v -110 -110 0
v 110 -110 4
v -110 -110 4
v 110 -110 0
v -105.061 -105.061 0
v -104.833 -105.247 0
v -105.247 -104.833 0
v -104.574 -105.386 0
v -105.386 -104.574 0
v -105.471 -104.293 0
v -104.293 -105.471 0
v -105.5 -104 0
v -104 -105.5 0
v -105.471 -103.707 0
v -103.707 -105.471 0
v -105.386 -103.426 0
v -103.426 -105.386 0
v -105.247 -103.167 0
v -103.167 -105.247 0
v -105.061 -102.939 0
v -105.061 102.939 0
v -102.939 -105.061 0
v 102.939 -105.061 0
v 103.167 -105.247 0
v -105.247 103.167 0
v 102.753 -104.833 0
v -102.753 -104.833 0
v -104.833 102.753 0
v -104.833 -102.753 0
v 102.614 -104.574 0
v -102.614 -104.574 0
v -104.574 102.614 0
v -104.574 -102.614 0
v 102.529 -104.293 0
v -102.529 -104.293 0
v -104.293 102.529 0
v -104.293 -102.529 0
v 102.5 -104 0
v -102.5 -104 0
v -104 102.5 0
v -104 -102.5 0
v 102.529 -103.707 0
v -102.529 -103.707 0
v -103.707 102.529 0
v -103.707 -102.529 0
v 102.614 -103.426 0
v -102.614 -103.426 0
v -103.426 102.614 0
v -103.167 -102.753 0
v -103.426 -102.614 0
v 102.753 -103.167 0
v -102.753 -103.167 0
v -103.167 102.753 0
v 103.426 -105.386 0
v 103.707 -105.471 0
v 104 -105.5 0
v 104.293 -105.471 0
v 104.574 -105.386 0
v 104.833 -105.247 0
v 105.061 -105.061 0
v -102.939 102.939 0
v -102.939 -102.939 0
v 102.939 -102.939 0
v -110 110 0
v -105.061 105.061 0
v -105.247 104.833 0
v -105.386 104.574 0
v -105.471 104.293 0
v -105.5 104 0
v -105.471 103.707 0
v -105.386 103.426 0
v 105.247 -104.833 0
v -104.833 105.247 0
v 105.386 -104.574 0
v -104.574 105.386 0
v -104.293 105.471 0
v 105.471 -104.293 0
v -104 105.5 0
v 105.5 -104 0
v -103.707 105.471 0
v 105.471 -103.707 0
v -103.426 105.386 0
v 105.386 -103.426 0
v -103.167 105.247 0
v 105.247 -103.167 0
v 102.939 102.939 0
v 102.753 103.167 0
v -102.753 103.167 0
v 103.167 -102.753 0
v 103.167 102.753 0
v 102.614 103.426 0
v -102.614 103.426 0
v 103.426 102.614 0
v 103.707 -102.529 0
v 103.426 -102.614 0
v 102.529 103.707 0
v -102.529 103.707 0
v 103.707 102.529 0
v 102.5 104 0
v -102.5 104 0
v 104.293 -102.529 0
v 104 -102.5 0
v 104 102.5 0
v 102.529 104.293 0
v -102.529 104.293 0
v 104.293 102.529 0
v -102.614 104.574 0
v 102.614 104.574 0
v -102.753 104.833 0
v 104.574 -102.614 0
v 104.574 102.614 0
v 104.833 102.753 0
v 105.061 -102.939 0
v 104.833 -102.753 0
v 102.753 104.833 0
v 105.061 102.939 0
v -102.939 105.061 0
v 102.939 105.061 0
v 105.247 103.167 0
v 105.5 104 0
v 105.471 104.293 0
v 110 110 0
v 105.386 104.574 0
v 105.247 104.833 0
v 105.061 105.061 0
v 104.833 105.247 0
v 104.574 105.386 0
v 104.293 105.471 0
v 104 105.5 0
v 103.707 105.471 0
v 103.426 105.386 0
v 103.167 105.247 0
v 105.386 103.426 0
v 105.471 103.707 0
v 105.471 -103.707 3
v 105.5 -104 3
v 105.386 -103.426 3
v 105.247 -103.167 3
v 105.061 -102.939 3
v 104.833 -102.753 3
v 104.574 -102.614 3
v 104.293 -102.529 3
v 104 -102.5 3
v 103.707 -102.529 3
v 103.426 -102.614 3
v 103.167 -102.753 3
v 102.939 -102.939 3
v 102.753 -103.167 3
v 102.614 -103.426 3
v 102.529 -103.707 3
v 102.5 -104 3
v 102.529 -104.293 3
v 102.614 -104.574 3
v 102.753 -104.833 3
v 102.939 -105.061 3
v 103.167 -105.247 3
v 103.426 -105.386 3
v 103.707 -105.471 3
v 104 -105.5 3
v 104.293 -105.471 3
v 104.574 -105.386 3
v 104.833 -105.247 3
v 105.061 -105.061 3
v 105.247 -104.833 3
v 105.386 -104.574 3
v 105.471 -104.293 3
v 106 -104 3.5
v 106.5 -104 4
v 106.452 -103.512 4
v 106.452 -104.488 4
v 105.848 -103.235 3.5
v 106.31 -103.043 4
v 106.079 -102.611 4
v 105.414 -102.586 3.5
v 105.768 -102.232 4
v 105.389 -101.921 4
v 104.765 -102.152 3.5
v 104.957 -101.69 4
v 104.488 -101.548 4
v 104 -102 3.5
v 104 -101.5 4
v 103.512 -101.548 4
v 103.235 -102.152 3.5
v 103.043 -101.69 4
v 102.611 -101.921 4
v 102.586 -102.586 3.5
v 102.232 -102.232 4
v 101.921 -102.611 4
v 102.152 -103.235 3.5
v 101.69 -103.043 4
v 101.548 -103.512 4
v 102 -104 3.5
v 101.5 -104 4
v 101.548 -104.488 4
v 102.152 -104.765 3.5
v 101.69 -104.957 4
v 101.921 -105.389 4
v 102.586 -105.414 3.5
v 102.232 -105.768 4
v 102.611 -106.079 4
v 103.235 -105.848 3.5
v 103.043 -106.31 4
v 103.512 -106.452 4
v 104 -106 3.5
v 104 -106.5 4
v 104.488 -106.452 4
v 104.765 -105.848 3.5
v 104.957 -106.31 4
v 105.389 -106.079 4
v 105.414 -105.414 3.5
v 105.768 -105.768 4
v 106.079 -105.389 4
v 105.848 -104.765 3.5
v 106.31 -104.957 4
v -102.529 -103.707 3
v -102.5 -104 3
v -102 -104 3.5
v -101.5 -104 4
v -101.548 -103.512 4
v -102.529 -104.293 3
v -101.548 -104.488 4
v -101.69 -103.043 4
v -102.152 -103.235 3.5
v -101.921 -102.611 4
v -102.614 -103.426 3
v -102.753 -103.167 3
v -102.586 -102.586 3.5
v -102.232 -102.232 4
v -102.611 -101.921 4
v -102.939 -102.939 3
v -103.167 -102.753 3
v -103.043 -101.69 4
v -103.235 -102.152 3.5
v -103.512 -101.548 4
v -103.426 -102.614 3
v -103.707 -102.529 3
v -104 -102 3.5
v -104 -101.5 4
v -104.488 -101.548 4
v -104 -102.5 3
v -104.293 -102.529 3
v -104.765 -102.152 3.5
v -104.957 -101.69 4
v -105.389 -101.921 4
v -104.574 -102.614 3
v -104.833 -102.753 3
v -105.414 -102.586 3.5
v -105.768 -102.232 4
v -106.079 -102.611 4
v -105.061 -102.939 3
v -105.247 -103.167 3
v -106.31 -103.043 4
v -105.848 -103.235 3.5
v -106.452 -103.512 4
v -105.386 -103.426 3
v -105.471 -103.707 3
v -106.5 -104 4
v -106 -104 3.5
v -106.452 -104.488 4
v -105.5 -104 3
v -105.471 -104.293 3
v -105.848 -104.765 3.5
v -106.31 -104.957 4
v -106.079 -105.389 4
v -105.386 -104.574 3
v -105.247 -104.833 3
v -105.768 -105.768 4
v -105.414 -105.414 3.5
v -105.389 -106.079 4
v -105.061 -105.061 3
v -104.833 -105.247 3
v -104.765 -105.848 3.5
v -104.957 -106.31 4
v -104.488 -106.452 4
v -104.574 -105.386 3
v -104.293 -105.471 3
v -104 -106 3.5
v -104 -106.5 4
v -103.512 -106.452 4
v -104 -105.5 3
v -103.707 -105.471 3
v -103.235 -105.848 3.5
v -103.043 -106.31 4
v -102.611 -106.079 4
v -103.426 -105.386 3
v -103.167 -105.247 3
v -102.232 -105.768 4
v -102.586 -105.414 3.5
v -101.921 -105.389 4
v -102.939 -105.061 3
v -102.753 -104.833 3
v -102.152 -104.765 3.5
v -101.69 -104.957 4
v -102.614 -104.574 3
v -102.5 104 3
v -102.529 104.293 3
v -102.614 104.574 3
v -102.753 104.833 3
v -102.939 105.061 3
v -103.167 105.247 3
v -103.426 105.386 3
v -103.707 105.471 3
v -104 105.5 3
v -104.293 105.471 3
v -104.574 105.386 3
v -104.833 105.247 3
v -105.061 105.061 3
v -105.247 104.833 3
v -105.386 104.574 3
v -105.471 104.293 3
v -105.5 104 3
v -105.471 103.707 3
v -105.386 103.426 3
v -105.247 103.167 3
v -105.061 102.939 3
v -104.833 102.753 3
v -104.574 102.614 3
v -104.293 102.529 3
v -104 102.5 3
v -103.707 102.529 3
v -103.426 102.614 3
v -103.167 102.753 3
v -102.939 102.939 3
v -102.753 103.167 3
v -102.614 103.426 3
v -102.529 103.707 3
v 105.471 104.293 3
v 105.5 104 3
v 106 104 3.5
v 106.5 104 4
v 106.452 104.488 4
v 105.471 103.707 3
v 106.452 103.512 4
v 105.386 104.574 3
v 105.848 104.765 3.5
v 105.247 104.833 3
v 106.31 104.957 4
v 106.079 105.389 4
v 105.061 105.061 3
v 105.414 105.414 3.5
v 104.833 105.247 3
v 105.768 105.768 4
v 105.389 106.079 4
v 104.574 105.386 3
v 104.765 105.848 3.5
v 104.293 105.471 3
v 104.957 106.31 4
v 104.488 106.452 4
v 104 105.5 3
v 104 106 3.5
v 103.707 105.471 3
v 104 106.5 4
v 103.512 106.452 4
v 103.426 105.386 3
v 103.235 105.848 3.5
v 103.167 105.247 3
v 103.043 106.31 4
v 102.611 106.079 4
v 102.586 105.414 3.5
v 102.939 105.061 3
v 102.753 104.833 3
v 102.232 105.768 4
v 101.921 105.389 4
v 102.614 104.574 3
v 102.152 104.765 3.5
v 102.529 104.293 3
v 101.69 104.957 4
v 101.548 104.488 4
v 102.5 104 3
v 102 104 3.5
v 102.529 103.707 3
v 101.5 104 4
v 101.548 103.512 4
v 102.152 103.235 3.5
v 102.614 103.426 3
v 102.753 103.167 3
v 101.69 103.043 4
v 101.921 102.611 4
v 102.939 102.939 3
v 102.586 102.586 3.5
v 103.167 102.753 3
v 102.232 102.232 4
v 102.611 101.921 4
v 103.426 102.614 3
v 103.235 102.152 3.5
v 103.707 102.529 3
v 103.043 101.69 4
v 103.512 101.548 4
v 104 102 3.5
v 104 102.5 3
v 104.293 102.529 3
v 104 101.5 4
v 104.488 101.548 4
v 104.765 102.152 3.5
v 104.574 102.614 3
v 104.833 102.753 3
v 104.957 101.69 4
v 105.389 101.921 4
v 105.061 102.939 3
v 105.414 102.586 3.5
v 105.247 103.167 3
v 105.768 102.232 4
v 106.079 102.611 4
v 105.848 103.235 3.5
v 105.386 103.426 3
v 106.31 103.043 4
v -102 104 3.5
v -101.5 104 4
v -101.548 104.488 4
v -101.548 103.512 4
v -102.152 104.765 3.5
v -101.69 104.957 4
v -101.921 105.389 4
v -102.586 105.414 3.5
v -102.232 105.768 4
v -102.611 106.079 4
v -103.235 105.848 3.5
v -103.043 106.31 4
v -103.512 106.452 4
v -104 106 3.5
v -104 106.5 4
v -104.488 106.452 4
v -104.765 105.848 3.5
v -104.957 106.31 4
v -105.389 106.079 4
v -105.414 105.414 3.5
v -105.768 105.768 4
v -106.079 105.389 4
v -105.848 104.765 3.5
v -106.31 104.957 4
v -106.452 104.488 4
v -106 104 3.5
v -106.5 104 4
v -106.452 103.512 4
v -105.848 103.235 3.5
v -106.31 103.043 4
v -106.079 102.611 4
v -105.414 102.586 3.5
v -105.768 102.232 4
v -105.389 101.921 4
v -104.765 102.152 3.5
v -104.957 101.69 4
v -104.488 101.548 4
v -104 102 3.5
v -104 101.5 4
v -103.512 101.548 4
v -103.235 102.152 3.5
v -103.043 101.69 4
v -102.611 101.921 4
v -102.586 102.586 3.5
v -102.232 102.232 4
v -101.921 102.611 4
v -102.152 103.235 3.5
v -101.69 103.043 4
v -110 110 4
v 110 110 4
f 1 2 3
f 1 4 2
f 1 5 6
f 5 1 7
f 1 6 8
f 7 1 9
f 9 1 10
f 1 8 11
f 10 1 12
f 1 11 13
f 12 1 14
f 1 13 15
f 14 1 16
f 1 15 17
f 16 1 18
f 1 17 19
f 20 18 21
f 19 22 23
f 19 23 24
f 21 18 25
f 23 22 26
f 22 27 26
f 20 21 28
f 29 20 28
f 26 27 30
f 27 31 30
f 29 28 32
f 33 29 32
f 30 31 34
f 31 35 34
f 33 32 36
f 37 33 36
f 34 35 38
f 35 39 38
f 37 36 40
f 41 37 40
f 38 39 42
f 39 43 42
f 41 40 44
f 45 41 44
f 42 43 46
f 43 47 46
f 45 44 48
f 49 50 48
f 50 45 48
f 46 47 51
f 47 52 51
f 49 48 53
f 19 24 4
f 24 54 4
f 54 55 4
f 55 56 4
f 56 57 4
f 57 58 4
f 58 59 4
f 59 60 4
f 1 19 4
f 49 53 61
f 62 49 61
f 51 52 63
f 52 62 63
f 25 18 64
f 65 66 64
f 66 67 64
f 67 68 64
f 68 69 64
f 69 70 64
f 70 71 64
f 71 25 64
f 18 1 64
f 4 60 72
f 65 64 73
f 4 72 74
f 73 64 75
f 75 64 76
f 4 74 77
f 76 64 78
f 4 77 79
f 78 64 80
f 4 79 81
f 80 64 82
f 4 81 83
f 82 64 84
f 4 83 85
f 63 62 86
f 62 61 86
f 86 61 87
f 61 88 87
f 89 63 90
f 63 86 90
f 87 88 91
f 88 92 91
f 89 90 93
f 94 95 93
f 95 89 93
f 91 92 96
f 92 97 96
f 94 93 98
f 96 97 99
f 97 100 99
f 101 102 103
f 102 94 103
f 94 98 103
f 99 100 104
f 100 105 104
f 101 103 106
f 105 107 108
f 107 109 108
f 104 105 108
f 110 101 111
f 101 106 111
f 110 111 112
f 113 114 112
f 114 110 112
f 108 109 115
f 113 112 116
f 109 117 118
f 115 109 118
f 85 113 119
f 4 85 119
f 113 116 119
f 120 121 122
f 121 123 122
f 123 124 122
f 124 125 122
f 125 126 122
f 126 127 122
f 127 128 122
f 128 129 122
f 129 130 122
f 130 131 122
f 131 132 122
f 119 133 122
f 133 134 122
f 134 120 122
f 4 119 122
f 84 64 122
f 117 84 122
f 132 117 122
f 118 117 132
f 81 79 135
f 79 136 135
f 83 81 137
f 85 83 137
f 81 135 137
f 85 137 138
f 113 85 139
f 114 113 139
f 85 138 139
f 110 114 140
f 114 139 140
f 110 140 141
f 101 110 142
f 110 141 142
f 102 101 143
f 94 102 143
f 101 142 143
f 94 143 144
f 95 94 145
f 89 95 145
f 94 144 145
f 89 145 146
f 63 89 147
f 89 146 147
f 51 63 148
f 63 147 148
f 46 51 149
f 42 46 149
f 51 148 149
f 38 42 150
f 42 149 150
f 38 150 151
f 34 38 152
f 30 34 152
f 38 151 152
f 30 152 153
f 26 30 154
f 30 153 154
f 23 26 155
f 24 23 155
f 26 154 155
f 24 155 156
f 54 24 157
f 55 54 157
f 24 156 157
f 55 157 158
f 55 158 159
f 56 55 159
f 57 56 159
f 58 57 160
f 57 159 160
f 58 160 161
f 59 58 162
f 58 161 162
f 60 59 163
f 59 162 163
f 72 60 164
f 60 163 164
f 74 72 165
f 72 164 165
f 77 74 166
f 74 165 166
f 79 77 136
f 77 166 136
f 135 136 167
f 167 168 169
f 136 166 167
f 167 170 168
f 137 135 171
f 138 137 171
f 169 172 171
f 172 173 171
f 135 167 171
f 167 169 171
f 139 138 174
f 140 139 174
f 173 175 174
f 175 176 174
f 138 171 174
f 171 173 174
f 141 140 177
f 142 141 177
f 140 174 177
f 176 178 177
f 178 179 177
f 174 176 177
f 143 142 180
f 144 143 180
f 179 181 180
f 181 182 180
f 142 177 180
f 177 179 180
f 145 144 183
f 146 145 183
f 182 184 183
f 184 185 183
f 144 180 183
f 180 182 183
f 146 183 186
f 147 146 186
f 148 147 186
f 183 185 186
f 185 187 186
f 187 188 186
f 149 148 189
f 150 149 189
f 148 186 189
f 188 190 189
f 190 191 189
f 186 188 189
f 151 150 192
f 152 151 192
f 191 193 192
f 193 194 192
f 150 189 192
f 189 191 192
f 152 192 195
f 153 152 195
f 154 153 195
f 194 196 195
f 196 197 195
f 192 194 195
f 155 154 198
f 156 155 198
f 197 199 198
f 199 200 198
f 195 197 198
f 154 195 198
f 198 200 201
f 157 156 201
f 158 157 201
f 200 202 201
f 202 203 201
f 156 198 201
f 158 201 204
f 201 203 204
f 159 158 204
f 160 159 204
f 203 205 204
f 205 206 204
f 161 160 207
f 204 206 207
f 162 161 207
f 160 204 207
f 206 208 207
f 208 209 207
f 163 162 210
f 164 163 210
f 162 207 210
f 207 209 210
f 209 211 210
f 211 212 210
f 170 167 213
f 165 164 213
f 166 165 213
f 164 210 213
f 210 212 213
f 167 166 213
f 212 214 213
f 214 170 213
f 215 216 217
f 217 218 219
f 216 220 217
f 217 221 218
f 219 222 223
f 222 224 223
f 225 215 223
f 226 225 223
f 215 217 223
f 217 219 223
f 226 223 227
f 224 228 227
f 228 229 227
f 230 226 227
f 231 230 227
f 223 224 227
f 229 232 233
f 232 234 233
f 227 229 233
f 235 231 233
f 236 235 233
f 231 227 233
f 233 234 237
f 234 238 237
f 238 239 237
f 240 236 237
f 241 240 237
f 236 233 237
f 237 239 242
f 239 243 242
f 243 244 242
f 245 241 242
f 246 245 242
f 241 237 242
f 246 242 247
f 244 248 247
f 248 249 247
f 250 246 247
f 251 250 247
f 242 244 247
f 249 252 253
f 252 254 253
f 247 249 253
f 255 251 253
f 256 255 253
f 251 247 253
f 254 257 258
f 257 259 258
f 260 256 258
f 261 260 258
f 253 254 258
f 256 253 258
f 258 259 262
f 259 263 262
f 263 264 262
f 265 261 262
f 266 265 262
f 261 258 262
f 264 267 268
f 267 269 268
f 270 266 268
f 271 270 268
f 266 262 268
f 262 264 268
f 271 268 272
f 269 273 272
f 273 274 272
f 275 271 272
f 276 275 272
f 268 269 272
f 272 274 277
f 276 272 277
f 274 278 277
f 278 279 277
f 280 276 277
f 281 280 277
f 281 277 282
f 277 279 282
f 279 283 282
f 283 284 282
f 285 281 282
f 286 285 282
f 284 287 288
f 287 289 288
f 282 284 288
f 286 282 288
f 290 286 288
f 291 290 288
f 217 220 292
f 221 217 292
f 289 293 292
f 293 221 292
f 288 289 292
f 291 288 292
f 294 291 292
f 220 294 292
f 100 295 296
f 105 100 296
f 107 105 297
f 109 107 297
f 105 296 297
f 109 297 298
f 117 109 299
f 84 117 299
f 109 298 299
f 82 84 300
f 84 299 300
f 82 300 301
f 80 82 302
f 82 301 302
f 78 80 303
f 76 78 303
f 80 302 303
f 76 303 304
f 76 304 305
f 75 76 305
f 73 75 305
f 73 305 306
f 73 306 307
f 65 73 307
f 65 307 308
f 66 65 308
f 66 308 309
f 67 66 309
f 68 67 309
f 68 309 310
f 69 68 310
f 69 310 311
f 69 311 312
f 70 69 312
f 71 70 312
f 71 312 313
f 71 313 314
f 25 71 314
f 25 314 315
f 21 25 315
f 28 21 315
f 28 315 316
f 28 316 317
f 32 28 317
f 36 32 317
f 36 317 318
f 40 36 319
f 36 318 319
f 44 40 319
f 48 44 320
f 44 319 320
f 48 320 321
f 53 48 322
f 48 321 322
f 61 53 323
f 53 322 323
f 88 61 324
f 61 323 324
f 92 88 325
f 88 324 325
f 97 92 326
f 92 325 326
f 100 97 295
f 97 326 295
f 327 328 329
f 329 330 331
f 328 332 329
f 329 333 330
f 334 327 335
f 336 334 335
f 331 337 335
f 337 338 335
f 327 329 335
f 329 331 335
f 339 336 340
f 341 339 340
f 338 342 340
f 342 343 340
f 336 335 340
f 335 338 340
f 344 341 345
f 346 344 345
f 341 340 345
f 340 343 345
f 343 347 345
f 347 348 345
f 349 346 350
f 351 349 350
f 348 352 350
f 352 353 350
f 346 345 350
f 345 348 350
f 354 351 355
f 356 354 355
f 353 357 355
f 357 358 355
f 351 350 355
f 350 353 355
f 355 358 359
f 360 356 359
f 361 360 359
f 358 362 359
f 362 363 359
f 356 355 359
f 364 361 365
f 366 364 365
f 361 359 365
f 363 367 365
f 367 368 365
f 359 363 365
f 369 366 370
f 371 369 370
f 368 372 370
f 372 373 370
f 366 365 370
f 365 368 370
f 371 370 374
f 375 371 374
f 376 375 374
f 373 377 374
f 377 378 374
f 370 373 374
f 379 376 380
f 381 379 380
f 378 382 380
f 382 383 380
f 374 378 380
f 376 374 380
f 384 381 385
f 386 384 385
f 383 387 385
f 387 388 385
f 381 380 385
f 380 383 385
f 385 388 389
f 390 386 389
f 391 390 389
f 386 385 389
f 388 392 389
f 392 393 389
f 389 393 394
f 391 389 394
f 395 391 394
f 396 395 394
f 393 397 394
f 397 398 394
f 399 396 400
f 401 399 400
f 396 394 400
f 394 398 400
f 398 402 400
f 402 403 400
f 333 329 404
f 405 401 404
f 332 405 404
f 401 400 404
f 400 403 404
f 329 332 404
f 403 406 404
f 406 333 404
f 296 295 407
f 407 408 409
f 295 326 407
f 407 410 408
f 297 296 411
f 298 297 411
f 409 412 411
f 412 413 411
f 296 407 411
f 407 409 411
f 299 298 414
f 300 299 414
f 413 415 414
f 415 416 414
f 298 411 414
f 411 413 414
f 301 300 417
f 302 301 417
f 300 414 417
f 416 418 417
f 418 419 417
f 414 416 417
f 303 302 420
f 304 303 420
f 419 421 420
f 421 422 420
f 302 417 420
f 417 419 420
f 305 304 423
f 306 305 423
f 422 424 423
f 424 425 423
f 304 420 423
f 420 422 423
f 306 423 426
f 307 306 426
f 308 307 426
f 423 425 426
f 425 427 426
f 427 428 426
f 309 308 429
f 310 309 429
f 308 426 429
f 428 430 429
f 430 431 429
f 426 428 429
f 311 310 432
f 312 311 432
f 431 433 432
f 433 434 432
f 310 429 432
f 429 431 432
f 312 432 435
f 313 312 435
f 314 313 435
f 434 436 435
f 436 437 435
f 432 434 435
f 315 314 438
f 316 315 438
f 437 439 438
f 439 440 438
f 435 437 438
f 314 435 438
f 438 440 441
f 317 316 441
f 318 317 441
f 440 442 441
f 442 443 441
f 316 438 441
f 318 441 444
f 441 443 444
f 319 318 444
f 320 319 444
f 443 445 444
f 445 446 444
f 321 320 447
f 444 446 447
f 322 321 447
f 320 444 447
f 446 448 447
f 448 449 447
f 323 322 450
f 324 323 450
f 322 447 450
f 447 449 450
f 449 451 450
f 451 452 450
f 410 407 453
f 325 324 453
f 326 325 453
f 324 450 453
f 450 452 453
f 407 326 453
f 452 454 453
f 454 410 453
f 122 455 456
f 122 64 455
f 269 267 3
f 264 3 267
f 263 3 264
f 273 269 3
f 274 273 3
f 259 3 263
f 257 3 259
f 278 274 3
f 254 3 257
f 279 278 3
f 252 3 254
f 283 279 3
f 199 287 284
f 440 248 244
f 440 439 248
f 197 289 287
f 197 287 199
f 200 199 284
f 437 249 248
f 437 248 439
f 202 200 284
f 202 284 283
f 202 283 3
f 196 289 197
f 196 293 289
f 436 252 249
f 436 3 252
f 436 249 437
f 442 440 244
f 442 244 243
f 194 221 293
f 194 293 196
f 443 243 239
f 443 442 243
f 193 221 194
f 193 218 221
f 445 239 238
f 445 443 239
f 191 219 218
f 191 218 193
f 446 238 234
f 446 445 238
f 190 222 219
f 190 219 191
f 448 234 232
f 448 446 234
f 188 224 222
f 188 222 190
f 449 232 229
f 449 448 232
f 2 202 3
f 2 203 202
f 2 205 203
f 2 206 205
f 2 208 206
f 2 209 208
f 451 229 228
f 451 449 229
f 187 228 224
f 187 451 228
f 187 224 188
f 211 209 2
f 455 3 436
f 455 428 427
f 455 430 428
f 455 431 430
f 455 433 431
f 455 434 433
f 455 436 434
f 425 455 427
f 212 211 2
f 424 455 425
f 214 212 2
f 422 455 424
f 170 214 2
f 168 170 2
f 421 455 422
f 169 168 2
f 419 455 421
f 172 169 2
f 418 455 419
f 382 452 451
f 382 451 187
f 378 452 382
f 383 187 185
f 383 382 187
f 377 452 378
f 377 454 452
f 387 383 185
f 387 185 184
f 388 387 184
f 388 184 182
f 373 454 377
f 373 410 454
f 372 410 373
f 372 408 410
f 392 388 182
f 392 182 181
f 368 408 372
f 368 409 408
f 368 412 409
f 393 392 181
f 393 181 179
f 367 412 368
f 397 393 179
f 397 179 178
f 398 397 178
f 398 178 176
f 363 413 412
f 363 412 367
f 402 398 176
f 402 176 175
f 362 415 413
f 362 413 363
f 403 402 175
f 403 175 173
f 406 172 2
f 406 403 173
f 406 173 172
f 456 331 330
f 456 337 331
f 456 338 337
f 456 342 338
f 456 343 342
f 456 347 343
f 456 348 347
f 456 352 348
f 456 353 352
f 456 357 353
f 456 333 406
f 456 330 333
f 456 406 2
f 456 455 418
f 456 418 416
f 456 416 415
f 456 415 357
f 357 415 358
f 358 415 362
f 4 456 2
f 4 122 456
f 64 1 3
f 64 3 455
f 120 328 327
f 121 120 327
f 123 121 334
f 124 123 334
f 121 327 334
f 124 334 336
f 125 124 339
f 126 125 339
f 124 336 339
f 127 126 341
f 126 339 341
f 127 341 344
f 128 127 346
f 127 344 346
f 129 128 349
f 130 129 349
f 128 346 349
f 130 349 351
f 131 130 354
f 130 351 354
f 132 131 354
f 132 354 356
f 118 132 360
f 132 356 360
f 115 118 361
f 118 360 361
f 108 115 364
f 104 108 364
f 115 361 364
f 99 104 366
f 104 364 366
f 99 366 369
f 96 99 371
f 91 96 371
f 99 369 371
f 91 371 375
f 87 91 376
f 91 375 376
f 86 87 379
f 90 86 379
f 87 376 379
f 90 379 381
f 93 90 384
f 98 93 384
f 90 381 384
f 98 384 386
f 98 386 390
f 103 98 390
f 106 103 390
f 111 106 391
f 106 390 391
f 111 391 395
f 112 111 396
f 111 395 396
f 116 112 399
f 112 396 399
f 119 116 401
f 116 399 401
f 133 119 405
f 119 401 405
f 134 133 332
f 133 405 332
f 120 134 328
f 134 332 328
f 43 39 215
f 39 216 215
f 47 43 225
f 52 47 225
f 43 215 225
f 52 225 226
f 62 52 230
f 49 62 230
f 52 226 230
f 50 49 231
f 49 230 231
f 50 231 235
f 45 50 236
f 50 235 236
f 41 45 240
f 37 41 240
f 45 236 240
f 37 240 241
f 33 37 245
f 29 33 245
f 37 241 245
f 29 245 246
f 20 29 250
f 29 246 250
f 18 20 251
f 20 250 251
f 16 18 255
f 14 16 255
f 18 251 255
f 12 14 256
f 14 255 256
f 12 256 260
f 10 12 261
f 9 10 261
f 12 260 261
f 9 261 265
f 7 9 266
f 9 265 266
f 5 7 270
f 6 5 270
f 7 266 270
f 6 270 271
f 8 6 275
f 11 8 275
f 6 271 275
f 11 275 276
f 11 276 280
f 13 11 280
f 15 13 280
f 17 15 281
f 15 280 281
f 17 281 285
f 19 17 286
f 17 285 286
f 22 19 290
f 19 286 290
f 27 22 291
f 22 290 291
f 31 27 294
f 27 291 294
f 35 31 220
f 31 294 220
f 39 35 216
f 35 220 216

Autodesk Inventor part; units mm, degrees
ref_plane "YZ Plane" through (0, 0, 0) normal (1, 0, 0) x (0, 1, 0)
ref_plane "XZ Plane" through (0, 0, 0) normal (0, 1, 0) x (-1, 0, 0)
ref_plane "XY Plane" through (0, 0, 0) normal (0, 0, 1) x (1, 0, 0)
sketch "Sketch1" plane through (0, 0, 0) normal (0, 0, 1) x (1, 0, 0)
  line L0 (-110, 110) -> (110, 110)
  line L1 (110, 110) -> (110, -110)
  line L2 (110, -110) -> (-110, -110)
  line L3 (-110, -110) -> (-110, 110)
  point P0 (0, 0)
  point P1 (110, 0)
  point P2 (0, -110)
  dimension "d0" = 220
  dimension "d1" = 220
extrude "Extrusion1" add sketch "Sketch1" along normal blind 4
sketch "Sketch2" plane through (0, 0, 4) normal (0, 0, 1) x (1, 0, 0)
  line L0 (110, 110) -> (-110, 110) projected
  line L1 (-110, 110) -> (-110, -110) projected
  line L2 (-110, -110) -> (110, -110) projected
  line L3 (110, -110) -> (110, 110) projected
  circle A0 centre (-104, 104) radius 1.5
  circle A1 centre (-104, -104) radius 1.5
  circle A2 centre (104, -104) radius 1.5
  circle A3 centre (104, 104) radius 1.5
  point P0 (0, 0)
  dimension "d4" = 6
  dimension "d5" = 6
  dimension "d6" = 3
  dimension "d9" = 360
extrude "Extrusion2" cut sketch "Sketch2" against normal up to next contours A0 | A1 | A2 | A3
chamfer "Chamfer1" distance 1 angle 45 4 edges at (102.5, 104, 4) (102.5, -104, 4) (-105.5, -104, 4) (-105.5, 104, 4)
properties part number "heated-bed"
